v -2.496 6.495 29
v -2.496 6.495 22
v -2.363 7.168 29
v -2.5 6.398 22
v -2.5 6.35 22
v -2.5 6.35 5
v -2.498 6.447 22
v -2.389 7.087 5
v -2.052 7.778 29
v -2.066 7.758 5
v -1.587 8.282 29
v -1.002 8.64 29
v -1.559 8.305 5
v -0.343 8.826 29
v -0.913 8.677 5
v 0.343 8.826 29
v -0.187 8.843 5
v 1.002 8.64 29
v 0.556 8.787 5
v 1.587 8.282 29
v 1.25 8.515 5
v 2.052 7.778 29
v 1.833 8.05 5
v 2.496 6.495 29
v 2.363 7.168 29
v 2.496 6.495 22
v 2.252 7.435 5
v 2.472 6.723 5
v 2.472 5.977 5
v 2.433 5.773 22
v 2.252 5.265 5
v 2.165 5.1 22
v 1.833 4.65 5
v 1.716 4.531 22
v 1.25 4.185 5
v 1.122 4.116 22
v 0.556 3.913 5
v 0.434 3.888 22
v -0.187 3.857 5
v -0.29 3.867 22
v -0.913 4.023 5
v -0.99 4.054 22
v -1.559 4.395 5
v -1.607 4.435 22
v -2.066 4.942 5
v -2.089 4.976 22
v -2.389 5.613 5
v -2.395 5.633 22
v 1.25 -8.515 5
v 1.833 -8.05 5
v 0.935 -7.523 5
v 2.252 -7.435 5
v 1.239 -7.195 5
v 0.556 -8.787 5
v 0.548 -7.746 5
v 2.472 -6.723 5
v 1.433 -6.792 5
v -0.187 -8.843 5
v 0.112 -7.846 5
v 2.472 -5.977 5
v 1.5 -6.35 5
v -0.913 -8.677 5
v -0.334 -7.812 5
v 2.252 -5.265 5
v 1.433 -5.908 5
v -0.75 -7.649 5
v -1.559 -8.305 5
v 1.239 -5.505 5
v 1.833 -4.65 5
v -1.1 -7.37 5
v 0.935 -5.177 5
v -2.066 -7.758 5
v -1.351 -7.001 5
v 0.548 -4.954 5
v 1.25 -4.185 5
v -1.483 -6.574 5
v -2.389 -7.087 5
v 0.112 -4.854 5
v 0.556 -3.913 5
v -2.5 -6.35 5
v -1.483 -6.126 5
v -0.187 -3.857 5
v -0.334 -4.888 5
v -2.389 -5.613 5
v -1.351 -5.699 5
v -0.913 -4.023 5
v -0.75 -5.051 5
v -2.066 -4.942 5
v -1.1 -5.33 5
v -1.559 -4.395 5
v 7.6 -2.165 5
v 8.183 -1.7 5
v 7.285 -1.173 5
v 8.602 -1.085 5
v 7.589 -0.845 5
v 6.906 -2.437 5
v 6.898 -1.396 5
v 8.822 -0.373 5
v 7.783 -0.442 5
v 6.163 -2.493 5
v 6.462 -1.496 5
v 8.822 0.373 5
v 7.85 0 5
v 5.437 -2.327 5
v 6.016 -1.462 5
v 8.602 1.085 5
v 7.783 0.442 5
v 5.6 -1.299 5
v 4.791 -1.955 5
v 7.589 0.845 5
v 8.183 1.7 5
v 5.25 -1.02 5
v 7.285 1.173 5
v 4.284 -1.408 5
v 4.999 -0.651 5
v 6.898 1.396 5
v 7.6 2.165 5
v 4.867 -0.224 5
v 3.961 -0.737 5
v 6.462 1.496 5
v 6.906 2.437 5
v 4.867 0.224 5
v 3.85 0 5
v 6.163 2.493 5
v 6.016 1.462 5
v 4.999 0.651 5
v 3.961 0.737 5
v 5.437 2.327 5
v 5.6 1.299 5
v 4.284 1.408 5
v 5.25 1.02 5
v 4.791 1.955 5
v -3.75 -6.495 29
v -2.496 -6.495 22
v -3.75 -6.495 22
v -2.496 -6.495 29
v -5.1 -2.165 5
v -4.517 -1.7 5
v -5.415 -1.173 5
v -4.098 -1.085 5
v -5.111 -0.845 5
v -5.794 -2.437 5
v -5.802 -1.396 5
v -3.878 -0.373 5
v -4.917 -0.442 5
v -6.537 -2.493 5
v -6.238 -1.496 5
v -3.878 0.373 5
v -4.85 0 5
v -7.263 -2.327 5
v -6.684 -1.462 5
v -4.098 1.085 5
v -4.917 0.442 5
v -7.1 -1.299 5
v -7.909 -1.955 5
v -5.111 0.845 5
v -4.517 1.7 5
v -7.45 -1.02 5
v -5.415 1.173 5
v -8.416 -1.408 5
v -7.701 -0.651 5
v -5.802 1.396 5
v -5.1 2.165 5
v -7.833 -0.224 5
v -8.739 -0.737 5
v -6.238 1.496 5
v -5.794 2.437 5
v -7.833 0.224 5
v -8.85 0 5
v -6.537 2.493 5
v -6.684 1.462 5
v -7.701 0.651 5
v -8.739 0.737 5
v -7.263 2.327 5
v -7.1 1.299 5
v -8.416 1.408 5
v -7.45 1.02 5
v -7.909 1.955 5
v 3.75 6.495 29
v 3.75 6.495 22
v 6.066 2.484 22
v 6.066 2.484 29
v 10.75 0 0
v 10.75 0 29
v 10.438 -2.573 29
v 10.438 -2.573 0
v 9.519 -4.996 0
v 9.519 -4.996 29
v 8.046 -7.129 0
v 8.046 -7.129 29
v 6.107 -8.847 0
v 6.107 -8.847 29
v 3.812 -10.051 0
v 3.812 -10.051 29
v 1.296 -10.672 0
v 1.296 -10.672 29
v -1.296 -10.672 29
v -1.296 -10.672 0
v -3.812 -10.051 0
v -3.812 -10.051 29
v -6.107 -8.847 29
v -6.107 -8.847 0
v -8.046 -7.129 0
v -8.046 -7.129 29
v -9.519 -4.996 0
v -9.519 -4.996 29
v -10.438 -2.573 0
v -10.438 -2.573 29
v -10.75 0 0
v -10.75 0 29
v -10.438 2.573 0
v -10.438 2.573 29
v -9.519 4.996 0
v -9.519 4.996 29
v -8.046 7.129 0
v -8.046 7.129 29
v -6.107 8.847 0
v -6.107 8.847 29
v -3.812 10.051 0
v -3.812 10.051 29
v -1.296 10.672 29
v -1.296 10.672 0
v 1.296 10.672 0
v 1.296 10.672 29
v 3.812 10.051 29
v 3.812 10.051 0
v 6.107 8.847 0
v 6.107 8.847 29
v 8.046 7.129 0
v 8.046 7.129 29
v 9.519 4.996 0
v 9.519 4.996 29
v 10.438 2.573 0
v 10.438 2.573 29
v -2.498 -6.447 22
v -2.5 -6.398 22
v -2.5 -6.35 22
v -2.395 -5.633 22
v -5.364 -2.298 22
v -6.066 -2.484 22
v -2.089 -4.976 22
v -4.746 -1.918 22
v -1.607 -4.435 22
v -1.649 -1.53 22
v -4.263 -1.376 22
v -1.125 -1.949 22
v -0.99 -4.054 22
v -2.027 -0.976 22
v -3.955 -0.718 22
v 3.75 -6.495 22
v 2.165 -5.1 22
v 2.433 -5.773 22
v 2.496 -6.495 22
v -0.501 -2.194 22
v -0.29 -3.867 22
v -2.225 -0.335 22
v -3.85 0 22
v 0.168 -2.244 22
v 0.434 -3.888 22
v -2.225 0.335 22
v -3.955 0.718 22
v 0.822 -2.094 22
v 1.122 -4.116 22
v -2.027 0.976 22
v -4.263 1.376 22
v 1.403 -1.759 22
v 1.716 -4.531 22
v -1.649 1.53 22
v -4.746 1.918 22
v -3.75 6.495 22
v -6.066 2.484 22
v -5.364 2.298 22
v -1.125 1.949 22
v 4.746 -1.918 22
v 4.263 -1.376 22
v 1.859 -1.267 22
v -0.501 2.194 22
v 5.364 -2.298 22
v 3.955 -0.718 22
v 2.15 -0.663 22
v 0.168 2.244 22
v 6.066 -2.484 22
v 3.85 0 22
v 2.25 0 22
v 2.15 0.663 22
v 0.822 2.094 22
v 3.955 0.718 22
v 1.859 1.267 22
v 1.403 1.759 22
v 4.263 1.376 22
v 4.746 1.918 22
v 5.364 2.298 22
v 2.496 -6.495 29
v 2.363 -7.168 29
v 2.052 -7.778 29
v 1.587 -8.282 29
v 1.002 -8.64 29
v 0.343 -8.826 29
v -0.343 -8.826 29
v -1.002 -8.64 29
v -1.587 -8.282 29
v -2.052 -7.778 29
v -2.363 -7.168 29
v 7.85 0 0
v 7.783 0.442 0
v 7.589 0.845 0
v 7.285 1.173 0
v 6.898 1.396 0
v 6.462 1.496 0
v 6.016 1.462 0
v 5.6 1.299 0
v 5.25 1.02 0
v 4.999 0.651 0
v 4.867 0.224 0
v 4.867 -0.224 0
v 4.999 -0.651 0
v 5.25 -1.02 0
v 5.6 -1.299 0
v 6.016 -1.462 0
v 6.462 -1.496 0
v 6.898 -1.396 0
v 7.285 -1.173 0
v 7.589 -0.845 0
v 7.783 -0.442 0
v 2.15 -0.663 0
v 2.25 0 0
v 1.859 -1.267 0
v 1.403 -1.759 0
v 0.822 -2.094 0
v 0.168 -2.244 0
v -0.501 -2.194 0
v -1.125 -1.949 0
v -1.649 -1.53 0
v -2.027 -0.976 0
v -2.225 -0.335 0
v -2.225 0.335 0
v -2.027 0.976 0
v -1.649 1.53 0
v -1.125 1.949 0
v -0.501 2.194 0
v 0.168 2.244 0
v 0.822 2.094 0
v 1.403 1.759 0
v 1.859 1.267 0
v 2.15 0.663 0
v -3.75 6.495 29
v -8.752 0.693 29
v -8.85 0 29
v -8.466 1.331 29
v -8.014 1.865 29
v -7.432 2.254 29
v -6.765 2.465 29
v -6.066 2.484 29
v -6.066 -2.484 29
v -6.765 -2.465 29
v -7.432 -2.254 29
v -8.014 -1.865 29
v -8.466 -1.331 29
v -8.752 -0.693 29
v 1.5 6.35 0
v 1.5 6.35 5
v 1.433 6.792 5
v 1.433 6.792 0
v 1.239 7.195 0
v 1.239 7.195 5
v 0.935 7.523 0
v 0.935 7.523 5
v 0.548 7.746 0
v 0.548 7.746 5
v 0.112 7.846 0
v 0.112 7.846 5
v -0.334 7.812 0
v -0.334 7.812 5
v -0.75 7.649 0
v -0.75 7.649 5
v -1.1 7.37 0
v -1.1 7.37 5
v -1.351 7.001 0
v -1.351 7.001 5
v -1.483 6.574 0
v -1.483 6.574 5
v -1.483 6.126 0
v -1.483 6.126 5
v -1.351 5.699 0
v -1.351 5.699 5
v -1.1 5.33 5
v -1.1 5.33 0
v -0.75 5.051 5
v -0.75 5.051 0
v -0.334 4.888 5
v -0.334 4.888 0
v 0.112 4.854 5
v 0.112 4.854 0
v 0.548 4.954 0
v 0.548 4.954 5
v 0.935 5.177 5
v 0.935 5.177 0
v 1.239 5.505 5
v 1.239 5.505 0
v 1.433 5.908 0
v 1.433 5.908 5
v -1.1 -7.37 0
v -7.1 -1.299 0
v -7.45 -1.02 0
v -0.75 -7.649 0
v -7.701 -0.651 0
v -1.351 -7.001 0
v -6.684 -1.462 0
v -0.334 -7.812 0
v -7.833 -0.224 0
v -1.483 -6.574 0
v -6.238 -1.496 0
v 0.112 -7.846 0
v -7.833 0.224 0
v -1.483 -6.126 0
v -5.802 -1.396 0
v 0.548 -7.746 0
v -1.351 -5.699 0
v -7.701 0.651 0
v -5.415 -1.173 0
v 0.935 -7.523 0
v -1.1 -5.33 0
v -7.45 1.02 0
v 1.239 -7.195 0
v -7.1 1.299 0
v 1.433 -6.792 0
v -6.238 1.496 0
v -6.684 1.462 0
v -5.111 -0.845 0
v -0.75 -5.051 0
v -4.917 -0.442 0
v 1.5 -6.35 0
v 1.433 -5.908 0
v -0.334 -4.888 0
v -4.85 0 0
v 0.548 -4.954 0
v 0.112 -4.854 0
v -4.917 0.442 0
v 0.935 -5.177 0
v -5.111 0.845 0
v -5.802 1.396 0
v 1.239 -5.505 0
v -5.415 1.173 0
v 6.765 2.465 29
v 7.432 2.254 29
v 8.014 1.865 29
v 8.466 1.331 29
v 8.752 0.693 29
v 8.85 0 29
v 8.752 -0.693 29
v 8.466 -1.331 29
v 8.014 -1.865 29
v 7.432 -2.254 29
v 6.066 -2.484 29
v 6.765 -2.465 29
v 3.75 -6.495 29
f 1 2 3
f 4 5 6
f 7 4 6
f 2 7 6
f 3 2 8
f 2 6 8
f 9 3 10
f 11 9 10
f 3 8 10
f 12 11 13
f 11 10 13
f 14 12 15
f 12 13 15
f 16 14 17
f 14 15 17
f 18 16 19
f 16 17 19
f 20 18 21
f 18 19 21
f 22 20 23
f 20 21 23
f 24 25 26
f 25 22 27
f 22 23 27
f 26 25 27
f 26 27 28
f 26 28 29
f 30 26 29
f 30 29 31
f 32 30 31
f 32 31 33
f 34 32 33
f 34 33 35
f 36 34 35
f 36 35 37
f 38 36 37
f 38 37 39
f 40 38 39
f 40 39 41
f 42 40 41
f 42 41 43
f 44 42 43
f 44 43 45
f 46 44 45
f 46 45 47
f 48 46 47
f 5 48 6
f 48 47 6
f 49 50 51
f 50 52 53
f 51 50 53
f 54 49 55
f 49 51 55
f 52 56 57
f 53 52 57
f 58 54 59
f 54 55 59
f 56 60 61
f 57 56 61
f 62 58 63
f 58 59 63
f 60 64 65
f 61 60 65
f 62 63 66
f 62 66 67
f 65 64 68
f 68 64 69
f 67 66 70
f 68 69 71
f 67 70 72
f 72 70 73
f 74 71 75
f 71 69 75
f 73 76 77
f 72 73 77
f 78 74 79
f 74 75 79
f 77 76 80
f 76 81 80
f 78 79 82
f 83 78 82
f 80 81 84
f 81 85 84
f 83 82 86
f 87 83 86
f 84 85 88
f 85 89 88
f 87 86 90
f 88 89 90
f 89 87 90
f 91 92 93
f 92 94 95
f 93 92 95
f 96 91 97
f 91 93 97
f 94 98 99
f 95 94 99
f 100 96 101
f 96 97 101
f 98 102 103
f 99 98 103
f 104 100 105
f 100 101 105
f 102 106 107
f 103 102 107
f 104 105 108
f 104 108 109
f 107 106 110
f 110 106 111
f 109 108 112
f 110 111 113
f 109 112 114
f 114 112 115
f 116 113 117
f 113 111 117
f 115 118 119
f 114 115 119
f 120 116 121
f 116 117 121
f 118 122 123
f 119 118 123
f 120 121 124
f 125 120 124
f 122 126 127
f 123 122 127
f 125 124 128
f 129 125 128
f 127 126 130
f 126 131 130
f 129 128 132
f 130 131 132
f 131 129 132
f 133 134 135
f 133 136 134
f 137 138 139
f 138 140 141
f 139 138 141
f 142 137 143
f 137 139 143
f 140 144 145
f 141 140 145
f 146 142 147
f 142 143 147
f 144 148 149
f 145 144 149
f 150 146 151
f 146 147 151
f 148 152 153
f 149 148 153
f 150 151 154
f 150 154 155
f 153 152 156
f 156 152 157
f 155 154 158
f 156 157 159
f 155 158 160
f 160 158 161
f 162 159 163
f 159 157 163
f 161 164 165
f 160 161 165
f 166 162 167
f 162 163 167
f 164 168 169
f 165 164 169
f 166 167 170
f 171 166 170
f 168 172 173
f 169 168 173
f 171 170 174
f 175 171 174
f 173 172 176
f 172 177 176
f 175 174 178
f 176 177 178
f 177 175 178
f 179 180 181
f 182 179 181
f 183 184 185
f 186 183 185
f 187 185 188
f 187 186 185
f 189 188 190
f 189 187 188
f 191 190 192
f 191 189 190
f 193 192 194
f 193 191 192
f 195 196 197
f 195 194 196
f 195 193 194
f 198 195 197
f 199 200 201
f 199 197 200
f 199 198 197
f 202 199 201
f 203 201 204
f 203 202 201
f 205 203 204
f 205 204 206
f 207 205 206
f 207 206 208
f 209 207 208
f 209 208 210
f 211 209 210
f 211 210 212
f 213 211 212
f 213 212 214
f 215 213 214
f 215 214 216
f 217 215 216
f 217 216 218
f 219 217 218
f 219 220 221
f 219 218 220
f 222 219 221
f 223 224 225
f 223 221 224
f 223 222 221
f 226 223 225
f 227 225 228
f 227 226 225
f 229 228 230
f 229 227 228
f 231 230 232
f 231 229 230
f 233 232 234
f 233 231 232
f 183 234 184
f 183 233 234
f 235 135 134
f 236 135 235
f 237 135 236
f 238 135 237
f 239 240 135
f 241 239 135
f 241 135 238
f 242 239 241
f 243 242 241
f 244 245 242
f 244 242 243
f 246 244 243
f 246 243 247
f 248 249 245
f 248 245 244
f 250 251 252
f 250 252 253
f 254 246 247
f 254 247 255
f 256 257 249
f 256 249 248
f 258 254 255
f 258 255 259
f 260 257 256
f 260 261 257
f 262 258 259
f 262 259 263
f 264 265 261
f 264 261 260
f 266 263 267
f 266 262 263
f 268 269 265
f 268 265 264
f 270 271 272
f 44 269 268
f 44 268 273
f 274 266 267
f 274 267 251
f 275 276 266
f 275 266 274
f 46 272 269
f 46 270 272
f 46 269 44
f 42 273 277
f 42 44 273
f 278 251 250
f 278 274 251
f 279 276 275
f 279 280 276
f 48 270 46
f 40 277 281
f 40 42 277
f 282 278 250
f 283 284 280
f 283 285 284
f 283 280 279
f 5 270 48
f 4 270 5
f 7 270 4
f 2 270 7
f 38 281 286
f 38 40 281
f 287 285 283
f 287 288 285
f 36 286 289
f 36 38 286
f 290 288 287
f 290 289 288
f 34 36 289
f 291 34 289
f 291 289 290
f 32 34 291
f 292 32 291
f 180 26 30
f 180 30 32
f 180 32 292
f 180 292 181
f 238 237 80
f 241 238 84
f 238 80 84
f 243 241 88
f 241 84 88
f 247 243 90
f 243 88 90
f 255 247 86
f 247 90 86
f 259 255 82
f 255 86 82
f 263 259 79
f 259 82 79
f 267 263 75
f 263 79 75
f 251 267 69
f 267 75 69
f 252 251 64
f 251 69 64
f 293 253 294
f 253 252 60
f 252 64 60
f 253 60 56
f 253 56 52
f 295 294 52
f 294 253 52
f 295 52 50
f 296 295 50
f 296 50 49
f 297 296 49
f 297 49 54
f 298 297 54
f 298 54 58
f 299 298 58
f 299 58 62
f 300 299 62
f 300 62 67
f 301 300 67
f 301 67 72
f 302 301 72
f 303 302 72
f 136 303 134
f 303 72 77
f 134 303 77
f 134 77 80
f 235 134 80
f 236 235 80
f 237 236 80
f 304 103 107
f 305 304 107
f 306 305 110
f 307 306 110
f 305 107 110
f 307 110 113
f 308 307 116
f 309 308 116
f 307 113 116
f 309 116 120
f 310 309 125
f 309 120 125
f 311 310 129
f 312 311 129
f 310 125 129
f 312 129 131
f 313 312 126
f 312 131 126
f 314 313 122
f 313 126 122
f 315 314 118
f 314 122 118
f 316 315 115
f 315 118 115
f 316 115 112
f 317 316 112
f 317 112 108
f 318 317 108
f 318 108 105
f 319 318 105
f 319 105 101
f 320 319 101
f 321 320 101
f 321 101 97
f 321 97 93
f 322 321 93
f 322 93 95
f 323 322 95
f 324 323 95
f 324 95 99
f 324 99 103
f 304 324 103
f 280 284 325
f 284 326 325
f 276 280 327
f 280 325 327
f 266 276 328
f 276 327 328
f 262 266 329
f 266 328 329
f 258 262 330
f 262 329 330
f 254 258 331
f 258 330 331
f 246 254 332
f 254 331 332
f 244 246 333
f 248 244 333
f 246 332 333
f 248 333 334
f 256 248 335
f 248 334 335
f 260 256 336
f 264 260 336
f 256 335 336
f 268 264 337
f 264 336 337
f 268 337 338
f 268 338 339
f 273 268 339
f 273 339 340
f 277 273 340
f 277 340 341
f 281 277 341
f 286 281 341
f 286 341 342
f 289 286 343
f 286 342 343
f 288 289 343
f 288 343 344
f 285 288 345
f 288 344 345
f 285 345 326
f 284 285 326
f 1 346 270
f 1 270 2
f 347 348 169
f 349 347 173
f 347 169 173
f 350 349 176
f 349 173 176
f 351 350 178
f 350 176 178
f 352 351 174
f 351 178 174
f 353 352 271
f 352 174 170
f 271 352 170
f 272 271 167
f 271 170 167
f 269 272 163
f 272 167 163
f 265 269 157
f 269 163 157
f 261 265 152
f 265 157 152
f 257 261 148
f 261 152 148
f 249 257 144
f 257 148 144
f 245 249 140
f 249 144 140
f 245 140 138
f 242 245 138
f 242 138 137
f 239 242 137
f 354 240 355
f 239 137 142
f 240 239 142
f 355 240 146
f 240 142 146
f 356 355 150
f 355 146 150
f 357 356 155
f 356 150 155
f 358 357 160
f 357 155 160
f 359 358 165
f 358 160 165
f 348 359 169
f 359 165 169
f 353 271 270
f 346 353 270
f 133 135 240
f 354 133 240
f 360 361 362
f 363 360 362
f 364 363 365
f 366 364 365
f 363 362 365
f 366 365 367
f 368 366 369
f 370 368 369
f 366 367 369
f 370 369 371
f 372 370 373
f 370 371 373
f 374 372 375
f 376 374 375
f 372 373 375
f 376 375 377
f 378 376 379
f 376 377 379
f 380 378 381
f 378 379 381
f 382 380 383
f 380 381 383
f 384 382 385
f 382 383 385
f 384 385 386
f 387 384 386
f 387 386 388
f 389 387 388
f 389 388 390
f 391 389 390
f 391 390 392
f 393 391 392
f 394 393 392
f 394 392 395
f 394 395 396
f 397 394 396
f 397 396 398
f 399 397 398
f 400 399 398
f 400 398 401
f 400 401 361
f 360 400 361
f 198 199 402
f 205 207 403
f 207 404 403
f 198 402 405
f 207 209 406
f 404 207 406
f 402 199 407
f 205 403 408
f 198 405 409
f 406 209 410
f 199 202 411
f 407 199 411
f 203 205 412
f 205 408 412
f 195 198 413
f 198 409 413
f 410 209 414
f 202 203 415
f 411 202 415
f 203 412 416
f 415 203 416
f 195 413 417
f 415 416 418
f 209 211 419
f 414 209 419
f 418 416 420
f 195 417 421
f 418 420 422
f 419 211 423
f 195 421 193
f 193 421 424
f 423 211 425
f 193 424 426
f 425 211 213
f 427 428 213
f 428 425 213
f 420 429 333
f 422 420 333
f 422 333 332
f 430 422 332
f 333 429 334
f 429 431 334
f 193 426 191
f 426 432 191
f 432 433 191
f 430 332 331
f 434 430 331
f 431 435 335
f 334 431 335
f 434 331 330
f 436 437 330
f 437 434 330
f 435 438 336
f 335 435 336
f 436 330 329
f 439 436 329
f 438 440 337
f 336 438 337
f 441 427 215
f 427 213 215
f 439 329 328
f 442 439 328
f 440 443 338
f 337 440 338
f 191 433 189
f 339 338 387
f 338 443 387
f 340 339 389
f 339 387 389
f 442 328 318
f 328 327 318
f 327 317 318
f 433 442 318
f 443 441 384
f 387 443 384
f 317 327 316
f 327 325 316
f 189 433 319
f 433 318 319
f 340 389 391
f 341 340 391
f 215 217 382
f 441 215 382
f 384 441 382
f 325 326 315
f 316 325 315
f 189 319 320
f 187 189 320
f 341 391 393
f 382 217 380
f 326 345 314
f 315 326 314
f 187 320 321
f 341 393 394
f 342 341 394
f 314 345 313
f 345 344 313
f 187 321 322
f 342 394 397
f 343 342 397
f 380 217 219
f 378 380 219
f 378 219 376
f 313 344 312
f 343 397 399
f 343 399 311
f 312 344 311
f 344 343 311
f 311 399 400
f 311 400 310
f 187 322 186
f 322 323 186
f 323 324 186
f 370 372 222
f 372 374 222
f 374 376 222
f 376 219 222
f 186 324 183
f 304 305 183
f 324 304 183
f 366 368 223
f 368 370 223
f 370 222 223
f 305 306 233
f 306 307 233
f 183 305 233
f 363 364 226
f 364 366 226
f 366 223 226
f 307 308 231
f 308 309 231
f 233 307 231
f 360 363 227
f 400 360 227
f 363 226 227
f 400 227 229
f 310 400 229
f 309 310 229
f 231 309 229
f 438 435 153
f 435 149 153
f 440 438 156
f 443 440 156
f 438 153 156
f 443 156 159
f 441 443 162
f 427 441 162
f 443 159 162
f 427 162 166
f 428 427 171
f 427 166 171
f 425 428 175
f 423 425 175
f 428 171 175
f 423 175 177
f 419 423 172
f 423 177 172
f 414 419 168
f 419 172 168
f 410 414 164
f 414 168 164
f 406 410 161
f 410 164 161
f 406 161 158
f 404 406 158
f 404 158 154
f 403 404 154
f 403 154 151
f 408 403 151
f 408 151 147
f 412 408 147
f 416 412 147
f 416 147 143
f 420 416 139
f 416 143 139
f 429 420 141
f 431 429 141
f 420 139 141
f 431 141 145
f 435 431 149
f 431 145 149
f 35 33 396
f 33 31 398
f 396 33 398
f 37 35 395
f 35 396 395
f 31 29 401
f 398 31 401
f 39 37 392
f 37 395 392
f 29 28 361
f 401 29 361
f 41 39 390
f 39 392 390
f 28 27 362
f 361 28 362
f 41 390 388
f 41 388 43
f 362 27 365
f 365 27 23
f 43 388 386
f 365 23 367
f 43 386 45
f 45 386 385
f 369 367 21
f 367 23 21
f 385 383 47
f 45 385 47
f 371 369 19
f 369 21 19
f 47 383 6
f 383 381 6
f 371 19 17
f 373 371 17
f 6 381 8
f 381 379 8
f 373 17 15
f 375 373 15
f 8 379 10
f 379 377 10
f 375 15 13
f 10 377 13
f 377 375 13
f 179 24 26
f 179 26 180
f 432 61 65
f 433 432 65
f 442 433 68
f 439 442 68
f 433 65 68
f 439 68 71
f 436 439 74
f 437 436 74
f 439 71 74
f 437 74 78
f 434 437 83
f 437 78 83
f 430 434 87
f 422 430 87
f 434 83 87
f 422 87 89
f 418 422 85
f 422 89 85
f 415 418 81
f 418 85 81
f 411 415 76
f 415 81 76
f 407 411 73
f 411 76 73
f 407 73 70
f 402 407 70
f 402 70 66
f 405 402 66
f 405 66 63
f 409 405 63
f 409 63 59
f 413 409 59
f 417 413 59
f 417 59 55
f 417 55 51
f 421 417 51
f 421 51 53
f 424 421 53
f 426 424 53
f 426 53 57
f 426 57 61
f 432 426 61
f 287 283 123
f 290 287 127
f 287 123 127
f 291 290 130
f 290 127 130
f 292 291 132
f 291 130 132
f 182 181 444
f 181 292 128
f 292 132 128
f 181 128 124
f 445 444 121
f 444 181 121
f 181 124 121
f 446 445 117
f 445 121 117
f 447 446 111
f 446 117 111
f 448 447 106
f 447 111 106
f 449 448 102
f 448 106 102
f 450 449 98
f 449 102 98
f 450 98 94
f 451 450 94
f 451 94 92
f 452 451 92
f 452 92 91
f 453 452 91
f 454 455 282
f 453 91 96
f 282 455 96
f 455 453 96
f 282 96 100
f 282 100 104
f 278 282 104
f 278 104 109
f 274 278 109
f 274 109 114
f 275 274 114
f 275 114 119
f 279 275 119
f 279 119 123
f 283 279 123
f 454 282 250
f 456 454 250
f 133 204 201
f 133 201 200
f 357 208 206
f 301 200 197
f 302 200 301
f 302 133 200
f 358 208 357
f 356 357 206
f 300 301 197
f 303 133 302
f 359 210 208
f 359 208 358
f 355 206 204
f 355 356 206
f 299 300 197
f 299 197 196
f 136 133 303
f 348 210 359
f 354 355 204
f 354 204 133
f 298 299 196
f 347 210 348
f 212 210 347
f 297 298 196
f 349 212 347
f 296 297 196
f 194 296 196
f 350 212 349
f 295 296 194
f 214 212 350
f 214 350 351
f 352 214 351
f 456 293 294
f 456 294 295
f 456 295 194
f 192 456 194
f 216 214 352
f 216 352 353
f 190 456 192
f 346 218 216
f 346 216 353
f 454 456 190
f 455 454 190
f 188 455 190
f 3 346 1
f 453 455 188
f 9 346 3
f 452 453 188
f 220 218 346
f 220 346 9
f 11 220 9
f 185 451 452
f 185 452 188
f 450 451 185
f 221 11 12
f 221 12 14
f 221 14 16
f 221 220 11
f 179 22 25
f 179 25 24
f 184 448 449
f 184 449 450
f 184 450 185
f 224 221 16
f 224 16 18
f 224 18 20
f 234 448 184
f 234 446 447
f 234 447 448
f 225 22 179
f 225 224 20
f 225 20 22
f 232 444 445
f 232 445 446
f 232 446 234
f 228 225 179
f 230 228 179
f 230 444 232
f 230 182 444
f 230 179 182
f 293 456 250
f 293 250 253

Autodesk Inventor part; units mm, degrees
ref_plane "YZ Plane" through (0, 0, 0) normal (1, 0, 0) x (0, 1, 0)
ref_plane "XZ Plane" through (0, 0, 0) normal (0, 1, 0) x (-1, 0, 0)
sketch "Sketch1" plane through (0, 0, 0) normal (0, 0, 1) x (1, 0, 0)
  circle A0 centre (0, 0) radius 10.75
  circle A1 centre (0, 0) radius 2.25
  dimension "d0" = 21.5
  dimension "d1" = 4.5
extrude "Extrusion1" add sketch "Sketch1" along normal blind 29
sketch "Sketch2" plane through (0, 0, 29) normal (0, 0, 1) x (1, 0, 0)
  line L0 (7.5, 0) -> (3.75, -6.4952)
  line L1 (3.75, -6.4952) -> (-3.75, -6.4952)
  line L2 (-3.75, -6.4952) -> (-7.5, 0)
  line L3 (-7.5, 0) -> (-3.75, 6.4952)
  line L4 (-3.75, 6.4952) -> (3.75, 6.4952)
  line L5 (3.75, 6.4952) -> (7.5, 0)
  point P0 (0, 0)
  point P1 (0, 0)
  dimension "d4" = 15
extrude "Extrusion2" cut sketch "Sketch2" against normal blind 7
sketch "Sketch9" plane through (0, 0, 29) normal (0, 0, 1) x (1, 0, 0)
  circle A0 centre (0, -6.35) radius 1.5
  circle A1 centre (0, 6.35) radius 1.5
  line L0 (0, 6.35) -> (0, -6.35) construction
  circle A2 centre (6.35, 0) radius 1.5
  circle A3 centre (-6.35, 0) radius 1.5
  line L1 (-6.35, 0) -> (6.35, 0) construction
  point P0 (0, 0)
  point P1 (0, 0)
  dimension "d19" = 3
  dimension "d20" = 3
  dimension "d21" = 12.7
  dimension "d22" = 3
  dimension "d23" = 3
  dimension "d24" = 12.7
extrude "Extrusion6" cut sketch "Sketch9" against normal through all
ref_plane "Work Plane2" through (0, 0, 5) normal (0, 0, -1) x (-1, 0, 0)
sketch "Sketch11" plane through (0, 0, 5) normal (0, 0, -1) x (-1, 0, 0)
  circle A0 centre (-6.35, 0) radius 1.5 projected
  spline S0 degree 2 poles (-1.5, 6.35) (-1.5, 8.9481) (0.75, 7.649) (3, 6.35) (0.75, 5.051) (-1.5, 3.7519) (-1.5, 6.35) knots 0 0 0 0.333333 0.333333 0.666667 0.666667 1 1 1 weights 1 0.5 1 0.5 1 0.5 1 projected
  circle A1 centre (6.35, 0) radius 1.5 projected
  circle A2 centre (-6.35, 0) radius 2.5
  circle A3 centre (0, 6.35) radius 1.5 projected
  circle A4 centre (0, 6.35) radius 2.5
  circle A5 centre (6.35, 0) radius 2.5
  circle A6 centre (0, -6.35) radius 1.5 projected
  circle A7 centre (0, -6.35) radius 2.5
  point P0 (0, 0)
  dimension "d32" = 5
  dimension "d33" = 5
  dimension "d34" = 5
  dimension "d35" = 5
extrude "Extrusion7" cut sketch "Sketch11" against normal through all contours A0 | S0 | A1 | A2 | A4 | A5 | A6 | A7
properties part number "AA032" material "ABS Plastic"
